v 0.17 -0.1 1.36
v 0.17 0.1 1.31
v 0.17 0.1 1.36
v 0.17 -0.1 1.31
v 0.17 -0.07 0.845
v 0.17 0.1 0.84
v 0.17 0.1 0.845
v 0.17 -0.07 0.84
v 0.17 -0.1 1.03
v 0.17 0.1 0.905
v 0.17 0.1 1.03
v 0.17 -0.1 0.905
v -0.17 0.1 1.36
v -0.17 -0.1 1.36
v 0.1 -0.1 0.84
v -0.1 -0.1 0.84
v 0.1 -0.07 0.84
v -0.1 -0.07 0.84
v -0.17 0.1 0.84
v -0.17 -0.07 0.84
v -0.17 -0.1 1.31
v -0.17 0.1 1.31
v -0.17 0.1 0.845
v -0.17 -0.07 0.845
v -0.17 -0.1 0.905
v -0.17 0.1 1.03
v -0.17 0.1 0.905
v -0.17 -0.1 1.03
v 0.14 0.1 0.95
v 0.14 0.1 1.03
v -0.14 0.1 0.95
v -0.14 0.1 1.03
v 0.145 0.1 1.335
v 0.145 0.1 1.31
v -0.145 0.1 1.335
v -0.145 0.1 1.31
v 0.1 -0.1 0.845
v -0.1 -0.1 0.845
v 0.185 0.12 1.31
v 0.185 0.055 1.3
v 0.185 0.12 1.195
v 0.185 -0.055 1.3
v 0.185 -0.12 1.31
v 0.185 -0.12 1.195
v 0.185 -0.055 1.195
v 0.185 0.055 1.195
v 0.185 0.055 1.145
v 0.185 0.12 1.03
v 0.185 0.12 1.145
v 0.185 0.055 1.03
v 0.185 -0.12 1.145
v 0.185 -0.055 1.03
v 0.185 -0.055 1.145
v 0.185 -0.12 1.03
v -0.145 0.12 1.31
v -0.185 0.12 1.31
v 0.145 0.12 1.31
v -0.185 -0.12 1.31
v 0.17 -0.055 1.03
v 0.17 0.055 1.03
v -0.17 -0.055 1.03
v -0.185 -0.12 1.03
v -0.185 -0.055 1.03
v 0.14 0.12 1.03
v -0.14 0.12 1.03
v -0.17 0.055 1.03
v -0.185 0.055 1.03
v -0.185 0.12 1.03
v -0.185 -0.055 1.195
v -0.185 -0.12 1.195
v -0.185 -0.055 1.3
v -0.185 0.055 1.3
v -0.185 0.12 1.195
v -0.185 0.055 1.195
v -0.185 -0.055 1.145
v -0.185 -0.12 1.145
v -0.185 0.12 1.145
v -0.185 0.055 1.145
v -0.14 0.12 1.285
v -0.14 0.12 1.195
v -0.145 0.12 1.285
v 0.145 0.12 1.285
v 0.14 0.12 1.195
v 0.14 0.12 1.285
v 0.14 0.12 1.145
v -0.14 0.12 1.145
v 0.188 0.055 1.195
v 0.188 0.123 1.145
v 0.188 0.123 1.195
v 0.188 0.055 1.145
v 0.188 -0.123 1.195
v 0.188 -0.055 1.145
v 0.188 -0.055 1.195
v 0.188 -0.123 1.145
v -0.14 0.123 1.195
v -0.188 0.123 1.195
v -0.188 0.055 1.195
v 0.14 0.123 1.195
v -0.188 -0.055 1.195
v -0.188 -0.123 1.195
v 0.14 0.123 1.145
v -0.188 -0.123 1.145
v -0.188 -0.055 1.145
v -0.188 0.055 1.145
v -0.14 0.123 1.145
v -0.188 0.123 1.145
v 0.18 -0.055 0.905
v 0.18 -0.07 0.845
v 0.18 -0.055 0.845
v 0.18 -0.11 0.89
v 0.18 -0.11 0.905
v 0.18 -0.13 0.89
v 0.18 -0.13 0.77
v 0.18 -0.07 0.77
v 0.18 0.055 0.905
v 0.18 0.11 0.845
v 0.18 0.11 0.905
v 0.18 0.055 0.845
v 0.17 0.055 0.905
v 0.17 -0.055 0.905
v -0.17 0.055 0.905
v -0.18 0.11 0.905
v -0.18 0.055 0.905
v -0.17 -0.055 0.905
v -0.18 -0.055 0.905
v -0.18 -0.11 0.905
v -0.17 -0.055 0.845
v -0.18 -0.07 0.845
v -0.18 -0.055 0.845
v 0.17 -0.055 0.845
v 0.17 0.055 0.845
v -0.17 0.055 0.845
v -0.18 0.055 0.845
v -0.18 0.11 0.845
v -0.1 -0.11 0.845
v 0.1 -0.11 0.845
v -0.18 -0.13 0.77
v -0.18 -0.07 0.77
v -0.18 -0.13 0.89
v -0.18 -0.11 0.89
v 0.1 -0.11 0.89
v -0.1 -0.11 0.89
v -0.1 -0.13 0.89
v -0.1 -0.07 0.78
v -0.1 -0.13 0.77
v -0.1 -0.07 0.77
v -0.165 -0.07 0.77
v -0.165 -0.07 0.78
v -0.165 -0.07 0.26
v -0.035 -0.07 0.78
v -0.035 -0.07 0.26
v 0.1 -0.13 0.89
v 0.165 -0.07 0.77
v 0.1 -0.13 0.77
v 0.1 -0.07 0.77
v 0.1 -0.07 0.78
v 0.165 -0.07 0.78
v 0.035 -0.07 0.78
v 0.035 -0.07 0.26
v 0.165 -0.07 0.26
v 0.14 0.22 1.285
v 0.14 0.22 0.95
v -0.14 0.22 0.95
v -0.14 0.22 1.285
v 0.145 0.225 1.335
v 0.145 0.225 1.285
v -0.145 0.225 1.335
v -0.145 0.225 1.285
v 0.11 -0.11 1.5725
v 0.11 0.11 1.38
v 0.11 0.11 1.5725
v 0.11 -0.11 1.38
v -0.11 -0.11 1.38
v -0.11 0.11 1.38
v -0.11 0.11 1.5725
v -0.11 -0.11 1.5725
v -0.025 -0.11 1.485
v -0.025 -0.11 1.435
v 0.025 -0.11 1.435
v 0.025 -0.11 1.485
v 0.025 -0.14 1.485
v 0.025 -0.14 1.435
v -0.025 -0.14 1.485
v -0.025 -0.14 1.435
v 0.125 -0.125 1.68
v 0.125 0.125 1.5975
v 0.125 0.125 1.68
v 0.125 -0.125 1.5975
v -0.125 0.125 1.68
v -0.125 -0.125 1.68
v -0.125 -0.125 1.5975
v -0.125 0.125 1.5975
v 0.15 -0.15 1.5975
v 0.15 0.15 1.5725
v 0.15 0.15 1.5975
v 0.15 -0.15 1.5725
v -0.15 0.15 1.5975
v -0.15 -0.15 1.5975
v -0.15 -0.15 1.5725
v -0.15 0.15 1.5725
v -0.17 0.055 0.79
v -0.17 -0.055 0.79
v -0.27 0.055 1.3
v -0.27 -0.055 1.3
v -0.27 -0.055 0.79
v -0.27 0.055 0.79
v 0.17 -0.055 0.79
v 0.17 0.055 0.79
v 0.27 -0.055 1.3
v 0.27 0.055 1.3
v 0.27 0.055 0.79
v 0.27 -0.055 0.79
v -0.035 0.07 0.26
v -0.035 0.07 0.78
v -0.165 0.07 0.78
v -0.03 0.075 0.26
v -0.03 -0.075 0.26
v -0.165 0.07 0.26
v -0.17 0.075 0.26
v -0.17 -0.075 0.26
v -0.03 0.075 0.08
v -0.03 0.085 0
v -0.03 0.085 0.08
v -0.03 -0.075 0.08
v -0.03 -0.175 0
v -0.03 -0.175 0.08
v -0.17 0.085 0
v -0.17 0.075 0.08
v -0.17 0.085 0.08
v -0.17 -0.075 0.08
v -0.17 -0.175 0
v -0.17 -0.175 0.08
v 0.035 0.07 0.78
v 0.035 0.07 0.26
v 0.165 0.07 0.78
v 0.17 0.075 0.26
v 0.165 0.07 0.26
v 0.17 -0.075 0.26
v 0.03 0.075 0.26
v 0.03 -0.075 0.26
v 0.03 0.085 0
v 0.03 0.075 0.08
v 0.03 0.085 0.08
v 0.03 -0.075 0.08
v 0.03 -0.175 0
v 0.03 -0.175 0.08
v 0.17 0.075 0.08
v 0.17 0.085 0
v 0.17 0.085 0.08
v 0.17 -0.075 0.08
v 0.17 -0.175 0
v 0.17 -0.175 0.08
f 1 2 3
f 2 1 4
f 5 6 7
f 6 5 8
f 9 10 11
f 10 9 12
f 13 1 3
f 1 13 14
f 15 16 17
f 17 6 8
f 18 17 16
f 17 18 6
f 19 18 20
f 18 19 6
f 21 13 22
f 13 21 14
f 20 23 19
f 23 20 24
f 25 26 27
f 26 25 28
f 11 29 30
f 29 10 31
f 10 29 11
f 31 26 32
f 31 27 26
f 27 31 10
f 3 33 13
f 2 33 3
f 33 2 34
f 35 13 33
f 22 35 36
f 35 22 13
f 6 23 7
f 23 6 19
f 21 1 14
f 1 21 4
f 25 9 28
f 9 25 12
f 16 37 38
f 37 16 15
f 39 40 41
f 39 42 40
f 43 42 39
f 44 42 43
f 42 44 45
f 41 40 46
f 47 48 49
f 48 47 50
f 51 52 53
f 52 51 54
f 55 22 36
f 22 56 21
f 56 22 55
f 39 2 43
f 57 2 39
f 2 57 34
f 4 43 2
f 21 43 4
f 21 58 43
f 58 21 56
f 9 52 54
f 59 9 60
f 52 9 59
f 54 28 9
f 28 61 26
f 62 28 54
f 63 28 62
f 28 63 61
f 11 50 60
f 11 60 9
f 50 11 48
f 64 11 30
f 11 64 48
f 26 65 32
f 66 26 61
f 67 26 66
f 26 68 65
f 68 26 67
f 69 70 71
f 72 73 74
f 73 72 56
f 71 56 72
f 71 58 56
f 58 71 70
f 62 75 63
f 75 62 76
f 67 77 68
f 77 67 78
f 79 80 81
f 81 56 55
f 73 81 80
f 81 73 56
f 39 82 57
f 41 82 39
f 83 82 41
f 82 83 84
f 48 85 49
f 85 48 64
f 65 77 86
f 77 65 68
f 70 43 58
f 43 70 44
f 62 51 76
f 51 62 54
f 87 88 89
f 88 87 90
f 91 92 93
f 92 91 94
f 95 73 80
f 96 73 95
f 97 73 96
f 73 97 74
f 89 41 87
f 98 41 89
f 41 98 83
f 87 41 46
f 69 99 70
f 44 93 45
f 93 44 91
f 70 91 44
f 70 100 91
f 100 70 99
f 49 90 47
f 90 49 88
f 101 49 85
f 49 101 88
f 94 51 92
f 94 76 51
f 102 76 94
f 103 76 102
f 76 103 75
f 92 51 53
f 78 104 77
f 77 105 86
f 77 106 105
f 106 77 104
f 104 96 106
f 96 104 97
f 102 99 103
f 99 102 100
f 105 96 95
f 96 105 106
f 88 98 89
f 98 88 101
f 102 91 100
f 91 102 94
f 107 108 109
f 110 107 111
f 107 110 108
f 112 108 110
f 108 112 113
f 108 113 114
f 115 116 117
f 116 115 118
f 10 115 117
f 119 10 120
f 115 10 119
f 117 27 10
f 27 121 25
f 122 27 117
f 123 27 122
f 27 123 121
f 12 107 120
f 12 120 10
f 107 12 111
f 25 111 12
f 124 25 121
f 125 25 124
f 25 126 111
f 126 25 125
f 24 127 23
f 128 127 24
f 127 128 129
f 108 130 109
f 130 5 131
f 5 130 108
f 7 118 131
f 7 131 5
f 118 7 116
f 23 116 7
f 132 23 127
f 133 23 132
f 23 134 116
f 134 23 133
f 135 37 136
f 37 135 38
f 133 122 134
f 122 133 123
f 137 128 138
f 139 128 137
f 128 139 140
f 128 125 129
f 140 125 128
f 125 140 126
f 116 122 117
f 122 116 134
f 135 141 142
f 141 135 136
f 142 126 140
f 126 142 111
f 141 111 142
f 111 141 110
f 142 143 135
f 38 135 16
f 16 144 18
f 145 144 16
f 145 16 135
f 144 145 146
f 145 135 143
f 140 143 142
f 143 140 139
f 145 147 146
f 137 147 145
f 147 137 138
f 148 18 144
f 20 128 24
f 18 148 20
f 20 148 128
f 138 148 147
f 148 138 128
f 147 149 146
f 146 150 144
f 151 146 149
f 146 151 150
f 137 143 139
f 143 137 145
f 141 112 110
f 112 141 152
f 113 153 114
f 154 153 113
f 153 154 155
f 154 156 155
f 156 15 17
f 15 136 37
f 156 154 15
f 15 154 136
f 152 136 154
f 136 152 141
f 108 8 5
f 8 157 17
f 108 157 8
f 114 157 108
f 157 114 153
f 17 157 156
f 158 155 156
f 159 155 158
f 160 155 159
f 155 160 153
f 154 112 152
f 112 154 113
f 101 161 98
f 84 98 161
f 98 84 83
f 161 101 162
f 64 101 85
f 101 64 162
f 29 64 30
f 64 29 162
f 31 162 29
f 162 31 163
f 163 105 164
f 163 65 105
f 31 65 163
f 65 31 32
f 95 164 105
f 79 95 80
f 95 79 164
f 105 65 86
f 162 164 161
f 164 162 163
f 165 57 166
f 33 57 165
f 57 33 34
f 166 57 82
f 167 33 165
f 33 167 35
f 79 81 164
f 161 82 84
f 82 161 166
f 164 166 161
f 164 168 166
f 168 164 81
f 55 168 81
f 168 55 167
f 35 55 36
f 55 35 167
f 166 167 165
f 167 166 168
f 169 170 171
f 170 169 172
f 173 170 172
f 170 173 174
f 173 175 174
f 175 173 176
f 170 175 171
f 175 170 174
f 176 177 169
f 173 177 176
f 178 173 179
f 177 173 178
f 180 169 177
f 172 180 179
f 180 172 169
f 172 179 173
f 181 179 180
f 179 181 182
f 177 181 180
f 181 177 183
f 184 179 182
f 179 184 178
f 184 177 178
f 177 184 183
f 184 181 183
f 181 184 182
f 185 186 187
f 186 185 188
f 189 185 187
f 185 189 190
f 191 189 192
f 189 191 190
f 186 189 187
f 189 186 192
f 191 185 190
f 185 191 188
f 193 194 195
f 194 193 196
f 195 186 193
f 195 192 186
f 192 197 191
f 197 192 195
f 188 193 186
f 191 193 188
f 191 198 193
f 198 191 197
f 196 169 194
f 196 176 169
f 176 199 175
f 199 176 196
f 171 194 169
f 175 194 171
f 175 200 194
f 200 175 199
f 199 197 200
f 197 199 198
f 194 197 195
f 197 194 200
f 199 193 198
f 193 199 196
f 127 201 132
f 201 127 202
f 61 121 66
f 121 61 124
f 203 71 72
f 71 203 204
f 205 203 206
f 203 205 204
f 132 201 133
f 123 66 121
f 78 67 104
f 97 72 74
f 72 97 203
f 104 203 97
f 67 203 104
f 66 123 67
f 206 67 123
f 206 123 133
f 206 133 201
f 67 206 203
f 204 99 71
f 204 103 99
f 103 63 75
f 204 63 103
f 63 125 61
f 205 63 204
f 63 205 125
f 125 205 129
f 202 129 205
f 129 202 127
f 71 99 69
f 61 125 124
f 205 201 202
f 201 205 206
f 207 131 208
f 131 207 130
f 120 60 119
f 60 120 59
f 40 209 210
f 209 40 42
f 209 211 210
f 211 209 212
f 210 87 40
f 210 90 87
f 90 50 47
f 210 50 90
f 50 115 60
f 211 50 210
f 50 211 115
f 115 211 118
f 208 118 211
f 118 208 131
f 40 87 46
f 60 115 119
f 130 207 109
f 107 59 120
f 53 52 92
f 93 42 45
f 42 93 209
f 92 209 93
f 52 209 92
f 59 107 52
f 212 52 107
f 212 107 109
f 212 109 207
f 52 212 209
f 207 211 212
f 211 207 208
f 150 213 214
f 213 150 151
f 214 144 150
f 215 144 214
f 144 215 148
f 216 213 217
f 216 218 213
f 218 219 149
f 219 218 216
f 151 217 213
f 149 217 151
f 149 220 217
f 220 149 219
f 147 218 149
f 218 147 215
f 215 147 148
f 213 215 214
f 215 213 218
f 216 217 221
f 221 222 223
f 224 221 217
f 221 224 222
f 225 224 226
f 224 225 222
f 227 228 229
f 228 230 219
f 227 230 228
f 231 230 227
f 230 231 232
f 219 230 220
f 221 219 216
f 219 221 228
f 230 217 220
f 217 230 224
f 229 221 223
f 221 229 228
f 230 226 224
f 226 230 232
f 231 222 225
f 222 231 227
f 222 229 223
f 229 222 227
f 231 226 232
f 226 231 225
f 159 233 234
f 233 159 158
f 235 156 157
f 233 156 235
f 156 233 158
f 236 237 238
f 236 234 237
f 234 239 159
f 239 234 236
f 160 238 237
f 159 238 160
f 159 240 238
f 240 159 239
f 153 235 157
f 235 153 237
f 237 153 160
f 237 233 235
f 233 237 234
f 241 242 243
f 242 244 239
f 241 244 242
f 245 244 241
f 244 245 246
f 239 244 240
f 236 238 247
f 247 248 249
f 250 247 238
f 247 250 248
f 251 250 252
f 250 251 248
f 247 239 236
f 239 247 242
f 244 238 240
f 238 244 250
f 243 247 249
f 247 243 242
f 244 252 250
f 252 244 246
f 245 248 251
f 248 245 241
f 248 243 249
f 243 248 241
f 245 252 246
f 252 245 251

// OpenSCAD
// ============================================================================
// worker.scad - 工地工人（kit_char 组装角色范例）
//
// ScadRig 契约同 agent_basic：1 unit = 1 m，Z-up，root 原点落地，面朝 -Y。
// 部件全部来自 assets/scad/lib/kit_char.scad；骨架 pivot 用 ch_pivot_*()，
// 因此 clip 直接复用库函数 ch_clip_*()。
// ch_TINT() 纯品红 = 运行时换色占位（反光背心 + 手套袖）。
// ============================================================================

use <../lib/kit_char.scad>

$fn = 8;

module bone_head()
{
    ch_head_box(ch_SKIN(1));
    ch_hat_helmet();
}

module bone_arm_l() { ch_arm_gloved(ch_TINT()); }
module bone_arm_r() { mirror([1, 0, 0]) ch_arm_gloved(ch_TINT()); }

module bone_leg_l() { ch_leg_boots(ch_DENIMC()); }
module bone_leg_r() { mirror([1, 0, 0]) ch_leg_boots(ch_DENIMC()); }

module bone_torso()
{
    ch_torso_vest(ch_TINT());
    ch_acc_toolbelt();
    ch_acc_backpack();
    translate(ch_pivot_head())  bone_head();
    translate(ch_pivot_arm_l()) bone_arm_l();
    translate(ch_pivot_arm_r()) bone_arm_r();
}

module bone_root()
{
    translate(ch_pivot_torso()) bone_torso();
    translate(ch_pivot_leg_l()) bone_leg_l();
    translate(ch_pivot_leg_r()) bone_leg_r();
}

bone_root();

// ---- 动画 clips（库函数） ----

anim_idle = ch_clip_idle();
anim_walk = ch_clip_walk();
anim_sit  = ch_clip_sit();
anim_work = ch_clip_work();
anim_wave = ch_clip_wave();
